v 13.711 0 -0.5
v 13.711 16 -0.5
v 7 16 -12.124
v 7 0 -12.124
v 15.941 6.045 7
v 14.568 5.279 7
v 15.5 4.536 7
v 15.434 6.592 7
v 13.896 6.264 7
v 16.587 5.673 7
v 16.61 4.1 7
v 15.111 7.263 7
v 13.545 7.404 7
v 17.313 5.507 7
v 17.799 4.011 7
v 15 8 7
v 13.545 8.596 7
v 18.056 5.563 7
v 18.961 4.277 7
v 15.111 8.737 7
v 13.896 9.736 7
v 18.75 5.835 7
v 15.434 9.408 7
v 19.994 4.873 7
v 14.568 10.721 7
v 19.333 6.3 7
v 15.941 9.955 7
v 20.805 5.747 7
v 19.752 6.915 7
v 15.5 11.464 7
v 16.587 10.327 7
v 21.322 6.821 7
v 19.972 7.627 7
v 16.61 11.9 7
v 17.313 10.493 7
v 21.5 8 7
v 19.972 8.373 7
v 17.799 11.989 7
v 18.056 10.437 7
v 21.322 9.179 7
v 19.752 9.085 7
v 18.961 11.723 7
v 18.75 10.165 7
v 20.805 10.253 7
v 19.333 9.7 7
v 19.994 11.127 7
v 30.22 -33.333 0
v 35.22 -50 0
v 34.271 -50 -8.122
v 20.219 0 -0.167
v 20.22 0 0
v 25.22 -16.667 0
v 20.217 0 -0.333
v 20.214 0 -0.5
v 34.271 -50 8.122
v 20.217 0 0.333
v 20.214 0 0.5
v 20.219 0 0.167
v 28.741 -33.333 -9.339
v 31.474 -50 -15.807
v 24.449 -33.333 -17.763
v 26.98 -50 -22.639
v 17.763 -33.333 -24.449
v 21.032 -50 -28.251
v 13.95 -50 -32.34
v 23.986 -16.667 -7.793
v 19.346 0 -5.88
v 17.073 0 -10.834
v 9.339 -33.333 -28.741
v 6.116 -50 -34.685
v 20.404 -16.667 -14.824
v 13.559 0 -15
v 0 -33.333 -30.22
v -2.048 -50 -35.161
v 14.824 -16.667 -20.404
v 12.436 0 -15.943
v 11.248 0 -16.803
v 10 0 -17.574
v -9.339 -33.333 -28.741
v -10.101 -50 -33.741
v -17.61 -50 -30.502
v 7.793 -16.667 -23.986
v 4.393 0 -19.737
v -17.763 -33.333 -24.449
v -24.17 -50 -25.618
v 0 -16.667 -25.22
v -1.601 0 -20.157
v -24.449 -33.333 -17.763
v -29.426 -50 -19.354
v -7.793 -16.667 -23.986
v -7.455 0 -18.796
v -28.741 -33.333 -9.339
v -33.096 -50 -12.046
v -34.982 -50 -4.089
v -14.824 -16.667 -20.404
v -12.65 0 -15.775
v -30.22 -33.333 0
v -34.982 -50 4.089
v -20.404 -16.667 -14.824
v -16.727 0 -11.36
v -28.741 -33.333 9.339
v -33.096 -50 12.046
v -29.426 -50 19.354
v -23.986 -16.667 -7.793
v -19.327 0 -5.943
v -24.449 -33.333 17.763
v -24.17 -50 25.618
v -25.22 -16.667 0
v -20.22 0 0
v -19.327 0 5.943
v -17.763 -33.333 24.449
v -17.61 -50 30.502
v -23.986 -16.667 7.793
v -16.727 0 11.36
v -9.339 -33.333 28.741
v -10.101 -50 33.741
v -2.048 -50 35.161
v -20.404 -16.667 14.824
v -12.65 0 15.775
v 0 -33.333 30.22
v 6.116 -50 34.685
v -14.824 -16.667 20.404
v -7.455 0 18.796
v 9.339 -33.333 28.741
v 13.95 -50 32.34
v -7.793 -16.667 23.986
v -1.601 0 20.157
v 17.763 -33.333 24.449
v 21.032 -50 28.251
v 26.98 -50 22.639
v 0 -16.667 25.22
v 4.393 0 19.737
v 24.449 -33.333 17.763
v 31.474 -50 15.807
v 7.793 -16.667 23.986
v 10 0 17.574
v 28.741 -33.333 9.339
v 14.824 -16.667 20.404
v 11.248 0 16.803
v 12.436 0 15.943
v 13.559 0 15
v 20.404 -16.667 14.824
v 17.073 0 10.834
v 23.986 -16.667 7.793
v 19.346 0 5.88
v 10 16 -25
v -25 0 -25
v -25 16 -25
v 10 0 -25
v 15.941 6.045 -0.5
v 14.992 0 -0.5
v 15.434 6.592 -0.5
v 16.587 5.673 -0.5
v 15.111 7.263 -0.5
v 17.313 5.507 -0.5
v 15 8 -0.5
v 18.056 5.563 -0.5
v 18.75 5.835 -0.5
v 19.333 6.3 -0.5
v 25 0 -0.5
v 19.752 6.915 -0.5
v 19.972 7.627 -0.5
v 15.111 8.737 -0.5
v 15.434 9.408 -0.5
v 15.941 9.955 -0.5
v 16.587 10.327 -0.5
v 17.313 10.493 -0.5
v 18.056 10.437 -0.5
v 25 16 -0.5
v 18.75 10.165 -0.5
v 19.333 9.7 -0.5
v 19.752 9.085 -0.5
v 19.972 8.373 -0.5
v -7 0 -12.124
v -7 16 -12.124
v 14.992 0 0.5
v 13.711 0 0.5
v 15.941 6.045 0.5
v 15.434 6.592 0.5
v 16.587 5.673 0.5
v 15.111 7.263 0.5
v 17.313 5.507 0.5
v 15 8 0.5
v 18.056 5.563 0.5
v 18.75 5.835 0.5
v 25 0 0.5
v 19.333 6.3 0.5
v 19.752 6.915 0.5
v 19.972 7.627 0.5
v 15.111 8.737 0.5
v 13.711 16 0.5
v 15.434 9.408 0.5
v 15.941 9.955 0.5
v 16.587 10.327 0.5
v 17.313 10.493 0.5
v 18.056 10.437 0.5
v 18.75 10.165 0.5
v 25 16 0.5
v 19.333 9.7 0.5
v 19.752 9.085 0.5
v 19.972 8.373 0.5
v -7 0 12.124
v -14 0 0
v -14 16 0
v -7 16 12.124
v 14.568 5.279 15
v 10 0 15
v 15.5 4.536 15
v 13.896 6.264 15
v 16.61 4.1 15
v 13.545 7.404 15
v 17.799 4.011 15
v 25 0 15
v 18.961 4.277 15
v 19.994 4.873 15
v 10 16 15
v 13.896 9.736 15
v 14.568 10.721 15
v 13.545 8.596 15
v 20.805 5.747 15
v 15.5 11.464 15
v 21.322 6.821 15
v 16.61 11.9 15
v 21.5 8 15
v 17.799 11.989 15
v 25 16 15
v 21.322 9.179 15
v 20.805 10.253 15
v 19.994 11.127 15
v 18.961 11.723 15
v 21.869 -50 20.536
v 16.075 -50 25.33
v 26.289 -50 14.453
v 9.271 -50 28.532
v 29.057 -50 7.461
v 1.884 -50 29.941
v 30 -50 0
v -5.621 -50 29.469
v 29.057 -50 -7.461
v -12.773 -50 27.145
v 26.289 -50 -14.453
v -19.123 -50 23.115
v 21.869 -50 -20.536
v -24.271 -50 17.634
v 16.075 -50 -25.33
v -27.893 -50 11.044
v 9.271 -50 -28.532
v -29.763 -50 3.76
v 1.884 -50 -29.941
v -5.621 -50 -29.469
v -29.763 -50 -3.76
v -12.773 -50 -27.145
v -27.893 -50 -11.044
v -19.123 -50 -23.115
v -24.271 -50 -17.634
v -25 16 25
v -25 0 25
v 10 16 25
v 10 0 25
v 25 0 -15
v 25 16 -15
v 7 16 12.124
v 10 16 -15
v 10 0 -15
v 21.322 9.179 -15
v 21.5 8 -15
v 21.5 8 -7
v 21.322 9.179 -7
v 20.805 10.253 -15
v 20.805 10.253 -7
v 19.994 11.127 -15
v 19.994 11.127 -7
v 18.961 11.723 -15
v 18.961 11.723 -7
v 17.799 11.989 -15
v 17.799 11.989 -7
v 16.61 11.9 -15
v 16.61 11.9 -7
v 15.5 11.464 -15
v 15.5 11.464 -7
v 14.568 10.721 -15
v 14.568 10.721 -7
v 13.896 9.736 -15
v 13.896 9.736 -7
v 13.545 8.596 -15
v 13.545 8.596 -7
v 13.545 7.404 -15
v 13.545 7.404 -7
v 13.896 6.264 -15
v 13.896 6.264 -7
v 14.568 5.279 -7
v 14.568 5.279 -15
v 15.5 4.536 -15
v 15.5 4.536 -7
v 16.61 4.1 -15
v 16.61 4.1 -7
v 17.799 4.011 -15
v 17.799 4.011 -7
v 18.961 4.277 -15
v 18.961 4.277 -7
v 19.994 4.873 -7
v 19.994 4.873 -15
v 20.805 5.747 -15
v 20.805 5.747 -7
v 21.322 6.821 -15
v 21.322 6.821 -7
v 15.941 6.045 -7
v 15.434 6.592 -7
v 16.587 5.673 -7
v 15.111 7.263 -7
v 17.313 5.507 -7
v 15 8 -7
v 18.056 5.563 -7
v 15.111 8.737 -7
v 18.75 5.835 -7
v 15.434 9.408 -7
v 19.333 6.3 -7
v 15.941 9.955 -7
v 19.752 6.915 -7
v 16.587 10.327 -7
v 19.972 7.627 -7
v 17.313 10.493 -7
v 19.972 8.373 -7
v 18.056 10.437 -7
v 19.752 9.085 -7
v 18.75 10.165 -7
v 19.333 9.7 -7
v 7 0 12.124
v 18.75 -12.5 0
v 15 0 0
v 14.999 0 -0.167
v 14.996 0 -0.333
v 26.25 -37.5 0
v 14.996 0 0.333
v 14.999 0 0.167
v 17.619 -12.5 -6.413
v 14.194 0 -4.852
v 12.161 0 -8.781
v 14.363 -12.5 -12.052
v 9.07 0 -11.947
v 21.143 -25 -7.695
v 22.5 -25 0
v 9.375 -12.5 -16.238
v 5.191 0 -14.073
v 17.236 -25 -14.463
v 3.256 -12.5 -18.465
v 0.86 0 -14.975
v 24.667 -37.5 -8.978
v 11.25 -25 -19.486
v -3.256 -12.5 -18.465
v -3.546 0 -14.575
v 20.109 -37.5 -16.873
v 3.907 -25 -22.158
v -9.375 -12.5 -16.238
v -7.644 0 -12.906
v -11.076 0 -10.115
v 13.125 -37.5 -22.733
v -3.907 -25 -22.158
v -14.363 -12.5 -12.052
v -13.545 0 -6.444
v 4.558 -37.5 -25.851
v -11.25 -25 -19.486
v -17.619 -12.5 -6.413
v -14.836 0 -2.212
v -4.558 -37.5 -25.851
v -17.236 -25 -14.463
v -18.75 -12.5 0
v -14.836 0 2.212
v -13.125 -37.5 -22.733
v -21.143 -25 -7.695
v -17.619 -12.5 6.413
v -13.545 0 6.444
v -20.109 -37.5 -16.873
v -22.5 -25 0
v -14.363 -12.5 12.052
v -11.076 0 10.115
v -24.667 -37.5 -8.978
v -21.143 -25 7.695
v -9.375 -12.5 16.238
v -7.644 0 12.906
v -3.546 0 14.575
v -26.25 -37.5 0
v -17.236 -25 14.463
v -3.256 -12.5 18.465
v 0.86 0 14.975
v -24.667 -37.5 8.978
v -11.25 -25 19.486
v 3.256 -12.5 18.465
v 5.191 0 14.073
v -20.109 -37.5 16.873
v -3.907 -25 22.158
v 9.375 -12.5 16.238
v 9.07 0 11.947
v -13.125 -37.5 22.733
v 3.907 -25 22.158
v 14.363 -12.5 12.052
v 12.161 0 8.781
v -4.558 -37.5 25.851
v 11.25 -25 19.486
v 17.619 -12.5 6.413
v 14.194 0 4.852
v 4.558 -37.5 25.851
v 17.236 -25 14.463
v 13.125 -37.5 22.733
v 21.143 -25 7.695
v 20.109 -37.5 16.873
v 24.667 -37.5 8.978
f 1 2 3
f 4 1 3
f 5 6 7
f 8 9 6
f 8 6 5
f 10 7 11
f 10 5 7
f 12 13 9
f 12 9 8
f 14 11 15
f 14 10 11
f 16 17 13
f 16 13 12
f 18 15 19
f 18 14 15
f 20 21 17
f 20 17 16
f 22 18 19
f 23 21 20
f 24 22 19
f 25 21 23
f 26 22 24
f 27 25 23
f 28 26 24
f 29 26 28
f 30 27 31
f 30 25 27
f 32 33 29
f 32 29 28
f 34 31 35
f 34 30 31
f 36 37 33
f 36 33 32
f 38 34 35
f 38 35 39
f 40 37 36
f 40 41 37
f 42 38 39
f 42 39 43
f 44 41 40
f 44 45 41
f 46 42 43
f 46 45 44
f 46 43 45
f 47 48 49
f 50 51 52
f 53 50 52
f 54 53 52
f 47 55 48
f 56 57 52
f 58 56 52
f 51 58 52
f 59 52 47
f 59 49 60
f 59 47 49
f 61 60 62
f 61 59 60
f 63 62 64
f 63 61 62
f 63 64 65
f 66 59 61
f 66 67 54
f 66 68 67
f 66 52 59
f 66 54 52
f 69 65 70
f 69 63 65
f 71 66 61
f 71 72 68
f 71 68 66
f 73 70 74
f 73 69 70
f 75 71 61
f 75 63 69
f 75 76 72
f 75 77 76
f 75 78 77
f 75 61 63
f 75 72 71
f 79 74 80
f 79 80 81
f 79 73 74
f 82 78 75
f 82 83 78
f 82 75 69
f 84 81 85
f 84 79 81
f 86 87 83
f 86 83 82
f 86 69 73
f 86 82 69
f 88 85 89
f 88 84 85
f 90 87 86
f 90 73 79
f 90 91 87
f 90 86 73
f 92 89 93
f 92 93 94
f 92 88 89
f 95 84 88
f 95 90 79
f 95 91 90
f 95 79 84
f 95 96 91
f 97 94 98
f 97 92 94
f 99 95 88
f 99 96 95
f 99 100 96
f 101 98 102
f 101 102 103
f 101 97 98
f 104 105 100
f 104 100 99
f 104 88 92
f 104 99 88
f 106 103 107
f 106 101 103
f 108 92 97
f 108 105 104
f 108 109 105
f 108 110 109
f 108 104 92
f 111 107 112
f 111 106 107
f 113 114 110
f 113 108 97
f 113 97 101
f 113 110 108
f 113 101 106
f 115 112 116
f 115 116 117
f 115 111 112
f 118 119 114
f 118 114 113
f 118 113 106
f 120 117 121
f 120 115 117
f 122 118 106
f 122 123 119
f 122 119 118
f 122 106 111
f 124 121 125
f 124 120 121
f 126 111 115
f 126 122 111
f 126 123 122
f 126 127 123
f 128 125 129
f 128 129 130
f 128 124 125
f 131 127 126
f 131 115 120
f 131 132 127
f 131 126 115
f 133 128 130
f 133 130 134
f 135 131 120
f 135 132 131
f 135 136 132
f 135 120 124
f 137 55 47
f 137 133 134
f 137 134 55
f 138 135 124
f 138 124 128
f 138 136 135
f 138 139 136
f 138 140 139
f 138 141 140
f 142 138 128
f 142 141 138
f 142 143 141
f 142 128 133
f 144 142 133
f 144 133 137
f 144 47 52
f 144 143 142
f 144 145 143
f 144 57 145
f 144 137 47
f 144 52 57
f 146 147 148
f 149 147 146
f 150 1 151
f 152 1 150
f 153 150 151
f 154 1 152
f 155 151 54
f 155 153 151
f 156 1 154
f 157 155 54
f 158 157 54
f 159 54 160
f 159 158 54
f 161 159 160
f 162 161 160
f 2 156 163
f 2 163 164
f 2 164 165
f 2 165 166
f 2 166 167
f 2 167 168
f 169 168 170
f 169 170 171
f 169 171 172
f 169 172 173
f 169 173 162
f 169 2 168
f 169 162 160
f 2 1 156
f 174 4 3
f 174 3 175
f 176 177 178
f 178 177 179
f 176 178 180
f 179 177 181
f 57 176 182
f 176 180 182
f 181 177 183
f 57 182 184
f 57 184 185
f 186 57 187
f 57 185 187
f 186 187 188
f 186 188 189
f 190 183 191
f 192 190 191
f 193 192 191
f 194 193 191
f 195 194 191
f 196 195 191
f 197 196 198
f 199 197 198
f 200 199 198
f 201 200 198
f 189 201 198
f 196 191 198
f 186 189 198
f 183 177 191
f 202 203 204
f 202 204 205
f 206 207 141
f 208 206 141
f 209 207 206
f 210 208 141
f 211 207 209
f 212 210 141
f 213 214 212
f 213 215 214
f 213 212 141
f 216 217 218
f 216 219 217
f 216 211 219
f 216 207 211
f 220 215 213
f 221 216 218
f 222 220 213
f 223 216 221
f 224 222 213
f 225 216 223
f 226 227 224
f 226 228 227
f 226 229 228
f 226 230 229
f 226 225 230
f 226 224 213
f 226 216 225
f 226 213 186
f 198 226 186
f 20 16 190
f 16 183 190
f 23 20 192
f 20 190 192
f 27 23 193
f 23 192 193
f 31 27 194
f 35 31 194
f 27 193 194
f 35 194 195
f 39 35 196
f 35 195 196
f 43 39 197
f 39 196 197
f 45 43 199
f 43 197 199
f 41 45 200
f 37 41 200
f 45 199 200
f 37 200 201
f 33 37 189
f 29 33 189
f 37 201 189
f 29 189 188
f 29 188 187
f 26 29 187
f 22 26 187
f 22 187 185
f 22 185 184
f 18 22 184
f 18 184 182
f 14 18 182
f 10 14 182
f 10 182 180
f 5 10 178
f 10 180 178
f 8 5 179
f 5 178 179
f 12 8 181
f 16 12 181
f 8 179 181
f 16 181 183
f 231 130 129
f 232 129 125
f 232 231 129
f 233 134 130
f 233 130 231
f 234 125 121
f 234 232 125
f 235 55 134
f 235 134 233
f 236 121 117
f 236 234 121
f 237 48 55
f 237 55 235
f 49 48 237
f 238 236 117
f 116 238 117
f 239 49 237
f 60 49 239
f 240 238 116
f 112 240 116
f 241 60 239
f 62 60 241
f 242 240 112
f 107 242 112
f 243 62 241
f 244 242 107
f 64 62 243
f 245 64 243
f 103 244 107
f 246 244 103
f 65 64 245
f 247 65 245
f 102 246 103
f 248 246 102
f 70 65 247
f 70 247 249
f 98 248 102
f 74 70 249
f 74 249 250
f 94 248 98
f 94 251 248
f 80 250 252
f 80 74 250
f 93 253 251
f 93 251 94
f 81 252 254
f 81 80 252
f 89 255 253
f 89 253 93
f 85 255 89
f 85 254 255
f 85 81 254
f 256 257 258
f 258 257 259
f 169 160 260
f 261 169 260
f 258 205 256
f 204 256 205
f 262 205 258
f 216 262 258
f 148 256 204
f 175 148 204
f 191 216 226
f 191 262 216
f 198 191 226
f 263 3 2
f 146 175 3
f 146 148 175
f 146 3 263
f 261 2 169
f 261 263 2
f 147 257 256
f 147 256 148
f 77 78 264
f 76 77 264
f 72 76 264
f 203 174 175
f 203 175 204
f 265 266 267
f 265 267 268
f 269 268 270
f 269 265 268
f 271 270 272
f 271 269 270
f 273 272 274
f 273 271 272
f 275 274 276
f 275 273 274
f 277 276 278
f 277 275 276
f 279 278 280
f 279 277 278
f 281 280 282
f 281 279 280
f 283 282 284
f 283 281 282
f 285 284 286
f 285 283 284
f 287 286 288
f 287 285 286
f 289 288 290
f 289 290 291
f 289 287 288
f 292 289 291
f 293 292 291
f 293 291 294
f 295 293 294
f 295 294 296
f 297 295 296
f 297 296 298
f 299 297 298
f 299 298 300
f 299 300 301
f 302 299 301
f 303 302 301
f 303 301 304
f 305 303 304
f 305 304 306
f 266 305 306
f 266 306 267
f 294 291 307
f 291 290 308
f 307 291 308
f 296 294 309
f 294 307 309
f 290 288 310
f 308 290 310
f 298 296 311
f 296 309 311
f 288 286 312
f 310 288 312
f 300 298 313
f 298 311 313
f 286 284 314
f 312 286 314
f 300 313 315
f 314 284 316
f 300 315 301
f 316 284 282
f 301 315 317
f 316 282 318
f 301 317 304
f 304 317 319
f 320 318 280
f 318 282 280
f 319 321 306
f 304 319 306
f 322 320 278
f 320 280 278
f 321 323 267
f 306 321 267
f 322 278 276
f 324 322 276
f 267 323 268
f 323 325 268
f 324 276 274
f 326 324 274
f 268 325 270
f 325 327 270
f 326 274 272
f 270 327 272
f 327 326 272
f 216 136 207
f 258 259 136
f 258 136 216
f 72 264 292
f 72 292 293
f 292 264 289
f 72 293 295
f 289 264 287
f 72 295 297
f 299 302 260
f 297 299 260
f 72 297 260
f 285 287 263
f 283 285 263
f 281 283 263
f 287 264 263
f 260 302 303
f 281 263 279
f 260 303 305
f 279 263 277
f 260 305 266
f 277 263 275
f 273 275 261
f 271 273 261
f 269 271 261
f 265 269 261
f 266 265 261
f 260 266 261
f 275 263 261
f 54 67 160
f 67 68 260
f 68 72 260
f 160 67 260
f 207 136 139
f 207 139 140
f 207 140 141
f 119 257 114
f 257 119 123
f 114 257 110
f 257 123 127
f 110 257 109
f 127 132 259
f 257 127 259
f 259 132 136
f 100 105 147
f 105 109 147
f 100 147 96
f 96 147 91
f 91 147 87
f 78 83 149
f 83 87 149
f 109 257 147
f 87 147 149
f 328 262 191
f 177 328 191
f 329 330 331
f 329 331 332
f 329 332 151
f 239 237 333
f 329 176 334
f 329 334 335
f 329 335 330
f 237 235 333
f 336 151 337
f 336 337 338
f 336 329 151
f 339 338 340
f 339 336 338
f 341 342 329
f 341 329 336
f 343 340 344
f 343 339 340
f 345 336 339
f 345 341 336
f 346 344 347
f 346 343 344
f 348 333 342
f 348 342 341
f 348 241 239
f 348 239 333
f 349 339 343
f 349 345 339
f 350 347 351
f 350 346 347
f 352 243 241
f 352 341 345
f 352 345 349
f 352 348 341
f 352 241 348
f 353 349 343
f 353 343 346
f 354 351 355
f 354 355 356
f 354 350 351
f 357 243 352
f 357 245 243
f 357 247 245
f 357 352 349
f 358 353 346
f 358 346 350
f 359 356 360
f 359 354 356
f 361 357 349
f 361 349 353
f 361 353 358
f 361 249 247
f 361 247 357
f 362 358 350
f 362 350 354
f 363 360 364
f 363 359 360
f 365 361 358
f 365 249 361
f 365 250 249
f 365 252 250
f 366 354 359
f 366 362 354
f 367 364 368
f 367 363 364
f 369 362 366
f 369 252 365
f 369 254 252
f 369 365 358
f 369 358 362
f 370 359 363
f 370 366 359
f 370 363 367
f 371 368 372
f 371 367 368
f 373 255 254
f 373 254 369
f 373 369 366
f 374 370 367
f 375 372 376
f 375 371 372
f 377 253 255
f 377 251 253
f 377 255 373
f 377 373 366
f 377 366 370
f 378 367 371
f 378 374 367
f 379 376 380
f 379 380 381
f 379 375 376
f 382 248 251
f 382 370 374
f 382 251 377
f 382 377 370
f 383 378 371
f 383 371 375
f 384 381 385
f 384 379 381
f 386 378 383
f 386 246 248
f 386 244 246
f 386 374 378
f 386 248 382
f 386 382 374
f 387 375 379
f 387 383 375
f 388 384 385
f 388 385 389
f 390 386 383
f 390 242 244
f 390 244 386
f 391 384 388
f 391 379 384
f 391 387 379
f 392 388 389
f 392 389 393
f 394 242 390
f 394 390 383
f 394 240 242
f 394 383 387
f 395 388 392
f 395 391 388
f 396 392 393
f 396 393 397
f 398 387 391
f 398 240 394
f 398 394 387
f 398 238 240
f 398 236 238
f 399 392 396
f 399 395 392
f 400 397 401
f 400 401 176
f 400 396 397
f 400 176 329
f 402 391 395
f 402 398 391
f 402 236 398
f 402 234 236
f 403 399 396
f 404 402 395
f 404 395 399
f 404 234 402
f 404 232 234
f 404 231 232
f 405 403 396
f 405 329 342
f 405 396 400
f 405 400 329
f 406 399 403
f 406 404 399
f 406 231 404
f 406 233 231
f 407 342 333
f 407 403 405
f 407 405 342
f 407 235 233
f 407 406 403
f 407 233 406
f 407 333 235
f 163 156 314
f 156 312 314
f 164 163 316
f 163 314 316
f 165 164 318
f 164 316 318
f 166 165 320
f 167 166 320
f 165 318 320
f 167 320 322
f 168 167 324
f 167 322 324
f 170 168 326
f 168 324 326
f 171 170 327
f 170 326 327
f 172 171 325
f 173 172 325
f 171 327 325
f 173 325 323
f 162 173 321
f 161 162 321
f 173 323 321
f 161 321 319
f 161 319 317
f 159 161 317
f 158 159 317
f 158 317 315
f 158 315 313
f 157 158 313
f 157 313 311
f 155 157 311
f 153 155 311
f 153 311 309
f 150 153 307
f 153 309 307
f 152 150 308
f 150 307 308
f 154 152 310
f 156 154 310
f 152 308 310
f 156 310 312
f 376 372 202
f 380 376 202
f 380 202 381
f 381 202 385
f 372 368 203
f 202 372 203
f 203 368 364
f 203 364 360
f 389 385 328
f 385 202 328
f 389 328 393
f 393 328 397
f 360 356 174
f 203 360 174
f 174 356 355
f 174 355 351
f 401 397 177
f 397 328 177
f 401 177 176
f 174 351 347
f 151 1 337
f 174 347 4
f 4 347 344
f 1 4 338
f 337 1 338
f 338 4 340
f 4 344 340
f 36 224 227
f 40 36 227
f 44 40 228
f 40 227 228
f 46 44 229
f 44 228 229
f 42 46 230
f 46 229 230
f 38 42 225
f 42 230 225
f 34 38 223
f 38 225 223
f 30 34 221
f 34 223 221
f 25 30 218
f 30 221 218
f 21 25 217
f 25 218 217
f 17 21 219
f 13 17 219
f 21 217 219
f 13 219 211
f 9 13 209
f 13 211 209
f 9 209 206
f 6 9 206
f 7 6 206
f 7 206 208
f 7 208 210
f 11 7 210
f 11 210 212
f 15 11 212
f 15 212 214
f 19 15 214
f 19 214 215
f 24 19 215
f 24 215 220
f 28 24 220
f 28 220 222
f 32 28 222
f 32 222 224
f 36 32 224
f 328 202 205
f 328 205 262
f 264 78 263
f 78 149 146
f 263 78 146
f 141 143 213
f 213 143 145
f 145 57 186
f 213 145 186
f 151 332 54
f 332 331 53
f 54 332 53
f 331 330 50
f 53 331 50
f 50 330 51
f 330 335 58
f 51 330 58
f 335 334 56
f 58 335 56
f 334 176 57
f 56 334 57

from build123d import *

# Parameters (mm, degrees)
SKETCH2_W                      = 50
SKETCH2_H                      = 50
BOSS_EXTRUDE1_DEPTH            = 16
SKETCH9_W                      = 15
SKETCH9_H                      = 16
CUT_EXTRUDE2_DEPTH             = 10
CBORE_FOR_M4_SHCS2_D           = 5
CBORE_FOR_M4_SHCS2_CBORE_D     = 8
CBORE_FOR_M4_SHCS2_CBORE_DEPTH = 8
SKETCH13_W                     = 15
SKETCH13_H                     = 16
CUT_EXTRUDE5_DEPTH             = 0.5


# Read off the part's stored shape, not the designer's step: Loft-Thin1
with BuildPart() as part:
    # Sketch2 → Boss-Extrude1 (new body)
    with BuildSketch(Plane(origin=(0, 0, 0), x_dir=(1, 0, 0), z_dir=(0, 1, 0))):
        Rectangle(SKETCH2_W, SKETCH2_H)
        Polygon((14, 0), (7, 12.124355653), (-7, 12.124355653), (-14, 0), (-7, -12.124355653), (7, -12.124355653), align=None, mode=Mode.SUBTRACT)
    extrude(amount=BOSS_EXTRUDE1_DEPTH)

    # Loft-Thin1 outline → Loft-Thin1 (revolve)
    with BuildSketch(Plane.XY):
        Polygon((30, -50), (35.220153254, -50), (20.220153254, 0), (15, 0), align=None)
    revolve(axis=Axis((0, 0, 0), (0, 1, 0)))

    # Sketch9 → Cut-Extrude2 (cut)
    with BuildSketch(Plane.XY.offset(25)):
        with Locations((17.5, 8)):
            Rectangle(SKETCH9_W, SKETCH9_H)
    cut_extrude2 = extrude(amount=-CUT_EXTRUDE2_DEPTH, mode=Mode.SUBTRACT)

    # Mirror2: Cut-Extrude2 across plane
    add(cut_extrude2.mirror(Plane.XY), mode=Mode.SUBTRACT)

    # CBORE for M4 SHCS2 (through all)
    with Locations(Plane(origin=(17.5, 8, 15), x_dir=(1, 0, 0), z_dir=(0, 0, 1))):
        with Locations((0, 0)):
            cbore_for_m4_shcs2 = CounterBoreHole(CBORE_FOR_M4_SHCS2_D / 2, CBORE_FOR_M4_SHCS2_CBORE_D / 2, CBORE_FOR_M4_SHCS2_CBORE_DEPTH)

    # Mirror3: CBORE for M4 SHCS2 across plane
    add(cbore_for_m4_shcs2.mirror(Plane.XY), mode=Mode.SUBTRACT)

    # Sketch13 → Cut-Extrude5 (cut, symmetric)
    with BuildSketch(Plane.XY):
        with Locations((17.5, 8)):
            Rectangle(SKETCH13_W, SKETCH13_H)
    extrude(amount=CUT_EXTRUDE5_DEPTH, both=True, mode=Mode.SUBTRACT)


solid = part.part
